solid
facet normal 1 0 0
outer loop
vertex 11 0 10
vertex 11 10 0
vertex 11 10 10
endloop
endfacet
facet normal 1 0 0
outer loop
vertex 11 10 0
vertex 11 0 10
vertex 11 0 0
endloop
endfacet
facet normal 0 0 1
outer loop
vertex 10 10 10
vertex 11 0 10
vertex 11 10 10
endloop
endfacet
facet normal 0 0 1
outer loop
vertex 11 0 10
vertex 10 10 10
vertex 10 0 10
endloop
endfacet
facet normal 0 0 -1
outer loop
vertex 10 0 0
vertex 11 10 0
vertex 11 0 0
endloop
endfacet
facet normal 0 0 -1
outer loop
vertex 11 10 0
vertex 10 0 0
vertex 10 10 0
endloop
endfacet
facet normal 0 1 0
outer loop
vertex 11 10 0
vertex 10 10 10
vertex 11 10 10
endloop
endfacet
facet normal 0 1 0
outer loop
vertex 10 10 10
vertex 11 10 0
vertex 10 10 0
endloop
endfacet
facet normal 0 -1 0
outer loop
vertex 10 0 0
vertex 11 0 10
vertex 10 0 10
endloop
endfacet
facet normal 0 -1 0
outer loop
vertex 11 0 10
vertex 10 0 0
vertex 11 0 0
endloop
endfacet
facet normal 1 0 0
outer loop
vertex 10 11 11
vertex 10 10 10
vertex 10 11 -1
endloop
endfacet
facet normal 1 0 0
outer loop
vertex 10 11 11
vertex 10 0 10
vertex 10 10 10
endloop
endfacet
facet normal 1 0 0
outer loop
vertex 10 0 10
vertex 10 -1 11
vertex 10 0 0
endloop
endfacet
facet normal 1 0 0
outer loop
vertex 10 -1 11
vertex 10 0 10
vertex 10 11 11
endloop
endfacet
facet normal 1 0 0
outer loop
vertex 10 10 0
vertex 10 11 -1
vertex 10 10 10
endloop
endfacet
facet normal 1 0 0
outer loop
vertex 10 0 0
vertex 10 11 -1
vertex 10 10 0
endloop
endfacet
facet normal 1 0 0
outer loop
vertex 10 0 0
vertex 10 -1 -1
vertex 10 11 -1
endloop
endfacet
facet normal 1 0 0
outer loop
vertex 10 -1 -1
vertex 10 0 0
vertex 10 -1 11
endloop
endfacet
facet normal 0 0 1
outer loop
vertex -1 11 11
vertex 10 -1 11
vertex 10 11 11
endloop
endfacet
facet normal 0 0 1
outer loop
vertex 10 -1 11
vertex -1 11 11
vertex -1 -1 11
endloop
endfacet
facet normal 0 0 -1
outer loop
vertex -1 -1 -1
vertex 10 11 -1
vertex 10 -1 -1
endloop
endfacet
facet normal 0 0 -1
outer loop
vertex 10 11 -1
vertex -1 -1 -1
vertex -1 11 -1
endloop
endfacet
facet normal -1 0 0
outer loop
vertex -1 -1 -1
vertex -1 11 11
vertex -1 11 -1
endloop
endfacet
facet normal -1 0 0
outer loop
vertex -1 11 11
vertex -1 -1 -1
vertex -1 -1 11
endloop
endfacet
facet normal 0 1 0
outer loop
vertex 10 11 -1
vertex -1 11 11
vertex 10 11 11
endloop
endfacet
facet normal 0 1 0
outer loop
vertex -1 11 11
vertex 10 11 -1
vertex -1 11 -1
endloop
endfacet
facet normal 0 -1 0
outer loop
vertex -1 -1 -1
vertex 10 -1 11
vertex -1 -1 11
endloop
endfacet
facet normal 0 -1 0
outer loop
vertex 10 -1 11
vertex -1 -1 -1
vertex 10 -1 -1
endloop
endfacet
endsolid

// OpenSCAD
// Unit of length: Unit.MM
union()
{
   color(c = [1.0, 0.0, 0.0, 1.0])
   {
      cube(size = [11.0, 10.0, 10.0], center = false);
   }
   translate(v = [-1.0, -1.0, -1.0])
   {
      cube(size = [11.0, 12.0, 12.0], center = false);
   }
}
